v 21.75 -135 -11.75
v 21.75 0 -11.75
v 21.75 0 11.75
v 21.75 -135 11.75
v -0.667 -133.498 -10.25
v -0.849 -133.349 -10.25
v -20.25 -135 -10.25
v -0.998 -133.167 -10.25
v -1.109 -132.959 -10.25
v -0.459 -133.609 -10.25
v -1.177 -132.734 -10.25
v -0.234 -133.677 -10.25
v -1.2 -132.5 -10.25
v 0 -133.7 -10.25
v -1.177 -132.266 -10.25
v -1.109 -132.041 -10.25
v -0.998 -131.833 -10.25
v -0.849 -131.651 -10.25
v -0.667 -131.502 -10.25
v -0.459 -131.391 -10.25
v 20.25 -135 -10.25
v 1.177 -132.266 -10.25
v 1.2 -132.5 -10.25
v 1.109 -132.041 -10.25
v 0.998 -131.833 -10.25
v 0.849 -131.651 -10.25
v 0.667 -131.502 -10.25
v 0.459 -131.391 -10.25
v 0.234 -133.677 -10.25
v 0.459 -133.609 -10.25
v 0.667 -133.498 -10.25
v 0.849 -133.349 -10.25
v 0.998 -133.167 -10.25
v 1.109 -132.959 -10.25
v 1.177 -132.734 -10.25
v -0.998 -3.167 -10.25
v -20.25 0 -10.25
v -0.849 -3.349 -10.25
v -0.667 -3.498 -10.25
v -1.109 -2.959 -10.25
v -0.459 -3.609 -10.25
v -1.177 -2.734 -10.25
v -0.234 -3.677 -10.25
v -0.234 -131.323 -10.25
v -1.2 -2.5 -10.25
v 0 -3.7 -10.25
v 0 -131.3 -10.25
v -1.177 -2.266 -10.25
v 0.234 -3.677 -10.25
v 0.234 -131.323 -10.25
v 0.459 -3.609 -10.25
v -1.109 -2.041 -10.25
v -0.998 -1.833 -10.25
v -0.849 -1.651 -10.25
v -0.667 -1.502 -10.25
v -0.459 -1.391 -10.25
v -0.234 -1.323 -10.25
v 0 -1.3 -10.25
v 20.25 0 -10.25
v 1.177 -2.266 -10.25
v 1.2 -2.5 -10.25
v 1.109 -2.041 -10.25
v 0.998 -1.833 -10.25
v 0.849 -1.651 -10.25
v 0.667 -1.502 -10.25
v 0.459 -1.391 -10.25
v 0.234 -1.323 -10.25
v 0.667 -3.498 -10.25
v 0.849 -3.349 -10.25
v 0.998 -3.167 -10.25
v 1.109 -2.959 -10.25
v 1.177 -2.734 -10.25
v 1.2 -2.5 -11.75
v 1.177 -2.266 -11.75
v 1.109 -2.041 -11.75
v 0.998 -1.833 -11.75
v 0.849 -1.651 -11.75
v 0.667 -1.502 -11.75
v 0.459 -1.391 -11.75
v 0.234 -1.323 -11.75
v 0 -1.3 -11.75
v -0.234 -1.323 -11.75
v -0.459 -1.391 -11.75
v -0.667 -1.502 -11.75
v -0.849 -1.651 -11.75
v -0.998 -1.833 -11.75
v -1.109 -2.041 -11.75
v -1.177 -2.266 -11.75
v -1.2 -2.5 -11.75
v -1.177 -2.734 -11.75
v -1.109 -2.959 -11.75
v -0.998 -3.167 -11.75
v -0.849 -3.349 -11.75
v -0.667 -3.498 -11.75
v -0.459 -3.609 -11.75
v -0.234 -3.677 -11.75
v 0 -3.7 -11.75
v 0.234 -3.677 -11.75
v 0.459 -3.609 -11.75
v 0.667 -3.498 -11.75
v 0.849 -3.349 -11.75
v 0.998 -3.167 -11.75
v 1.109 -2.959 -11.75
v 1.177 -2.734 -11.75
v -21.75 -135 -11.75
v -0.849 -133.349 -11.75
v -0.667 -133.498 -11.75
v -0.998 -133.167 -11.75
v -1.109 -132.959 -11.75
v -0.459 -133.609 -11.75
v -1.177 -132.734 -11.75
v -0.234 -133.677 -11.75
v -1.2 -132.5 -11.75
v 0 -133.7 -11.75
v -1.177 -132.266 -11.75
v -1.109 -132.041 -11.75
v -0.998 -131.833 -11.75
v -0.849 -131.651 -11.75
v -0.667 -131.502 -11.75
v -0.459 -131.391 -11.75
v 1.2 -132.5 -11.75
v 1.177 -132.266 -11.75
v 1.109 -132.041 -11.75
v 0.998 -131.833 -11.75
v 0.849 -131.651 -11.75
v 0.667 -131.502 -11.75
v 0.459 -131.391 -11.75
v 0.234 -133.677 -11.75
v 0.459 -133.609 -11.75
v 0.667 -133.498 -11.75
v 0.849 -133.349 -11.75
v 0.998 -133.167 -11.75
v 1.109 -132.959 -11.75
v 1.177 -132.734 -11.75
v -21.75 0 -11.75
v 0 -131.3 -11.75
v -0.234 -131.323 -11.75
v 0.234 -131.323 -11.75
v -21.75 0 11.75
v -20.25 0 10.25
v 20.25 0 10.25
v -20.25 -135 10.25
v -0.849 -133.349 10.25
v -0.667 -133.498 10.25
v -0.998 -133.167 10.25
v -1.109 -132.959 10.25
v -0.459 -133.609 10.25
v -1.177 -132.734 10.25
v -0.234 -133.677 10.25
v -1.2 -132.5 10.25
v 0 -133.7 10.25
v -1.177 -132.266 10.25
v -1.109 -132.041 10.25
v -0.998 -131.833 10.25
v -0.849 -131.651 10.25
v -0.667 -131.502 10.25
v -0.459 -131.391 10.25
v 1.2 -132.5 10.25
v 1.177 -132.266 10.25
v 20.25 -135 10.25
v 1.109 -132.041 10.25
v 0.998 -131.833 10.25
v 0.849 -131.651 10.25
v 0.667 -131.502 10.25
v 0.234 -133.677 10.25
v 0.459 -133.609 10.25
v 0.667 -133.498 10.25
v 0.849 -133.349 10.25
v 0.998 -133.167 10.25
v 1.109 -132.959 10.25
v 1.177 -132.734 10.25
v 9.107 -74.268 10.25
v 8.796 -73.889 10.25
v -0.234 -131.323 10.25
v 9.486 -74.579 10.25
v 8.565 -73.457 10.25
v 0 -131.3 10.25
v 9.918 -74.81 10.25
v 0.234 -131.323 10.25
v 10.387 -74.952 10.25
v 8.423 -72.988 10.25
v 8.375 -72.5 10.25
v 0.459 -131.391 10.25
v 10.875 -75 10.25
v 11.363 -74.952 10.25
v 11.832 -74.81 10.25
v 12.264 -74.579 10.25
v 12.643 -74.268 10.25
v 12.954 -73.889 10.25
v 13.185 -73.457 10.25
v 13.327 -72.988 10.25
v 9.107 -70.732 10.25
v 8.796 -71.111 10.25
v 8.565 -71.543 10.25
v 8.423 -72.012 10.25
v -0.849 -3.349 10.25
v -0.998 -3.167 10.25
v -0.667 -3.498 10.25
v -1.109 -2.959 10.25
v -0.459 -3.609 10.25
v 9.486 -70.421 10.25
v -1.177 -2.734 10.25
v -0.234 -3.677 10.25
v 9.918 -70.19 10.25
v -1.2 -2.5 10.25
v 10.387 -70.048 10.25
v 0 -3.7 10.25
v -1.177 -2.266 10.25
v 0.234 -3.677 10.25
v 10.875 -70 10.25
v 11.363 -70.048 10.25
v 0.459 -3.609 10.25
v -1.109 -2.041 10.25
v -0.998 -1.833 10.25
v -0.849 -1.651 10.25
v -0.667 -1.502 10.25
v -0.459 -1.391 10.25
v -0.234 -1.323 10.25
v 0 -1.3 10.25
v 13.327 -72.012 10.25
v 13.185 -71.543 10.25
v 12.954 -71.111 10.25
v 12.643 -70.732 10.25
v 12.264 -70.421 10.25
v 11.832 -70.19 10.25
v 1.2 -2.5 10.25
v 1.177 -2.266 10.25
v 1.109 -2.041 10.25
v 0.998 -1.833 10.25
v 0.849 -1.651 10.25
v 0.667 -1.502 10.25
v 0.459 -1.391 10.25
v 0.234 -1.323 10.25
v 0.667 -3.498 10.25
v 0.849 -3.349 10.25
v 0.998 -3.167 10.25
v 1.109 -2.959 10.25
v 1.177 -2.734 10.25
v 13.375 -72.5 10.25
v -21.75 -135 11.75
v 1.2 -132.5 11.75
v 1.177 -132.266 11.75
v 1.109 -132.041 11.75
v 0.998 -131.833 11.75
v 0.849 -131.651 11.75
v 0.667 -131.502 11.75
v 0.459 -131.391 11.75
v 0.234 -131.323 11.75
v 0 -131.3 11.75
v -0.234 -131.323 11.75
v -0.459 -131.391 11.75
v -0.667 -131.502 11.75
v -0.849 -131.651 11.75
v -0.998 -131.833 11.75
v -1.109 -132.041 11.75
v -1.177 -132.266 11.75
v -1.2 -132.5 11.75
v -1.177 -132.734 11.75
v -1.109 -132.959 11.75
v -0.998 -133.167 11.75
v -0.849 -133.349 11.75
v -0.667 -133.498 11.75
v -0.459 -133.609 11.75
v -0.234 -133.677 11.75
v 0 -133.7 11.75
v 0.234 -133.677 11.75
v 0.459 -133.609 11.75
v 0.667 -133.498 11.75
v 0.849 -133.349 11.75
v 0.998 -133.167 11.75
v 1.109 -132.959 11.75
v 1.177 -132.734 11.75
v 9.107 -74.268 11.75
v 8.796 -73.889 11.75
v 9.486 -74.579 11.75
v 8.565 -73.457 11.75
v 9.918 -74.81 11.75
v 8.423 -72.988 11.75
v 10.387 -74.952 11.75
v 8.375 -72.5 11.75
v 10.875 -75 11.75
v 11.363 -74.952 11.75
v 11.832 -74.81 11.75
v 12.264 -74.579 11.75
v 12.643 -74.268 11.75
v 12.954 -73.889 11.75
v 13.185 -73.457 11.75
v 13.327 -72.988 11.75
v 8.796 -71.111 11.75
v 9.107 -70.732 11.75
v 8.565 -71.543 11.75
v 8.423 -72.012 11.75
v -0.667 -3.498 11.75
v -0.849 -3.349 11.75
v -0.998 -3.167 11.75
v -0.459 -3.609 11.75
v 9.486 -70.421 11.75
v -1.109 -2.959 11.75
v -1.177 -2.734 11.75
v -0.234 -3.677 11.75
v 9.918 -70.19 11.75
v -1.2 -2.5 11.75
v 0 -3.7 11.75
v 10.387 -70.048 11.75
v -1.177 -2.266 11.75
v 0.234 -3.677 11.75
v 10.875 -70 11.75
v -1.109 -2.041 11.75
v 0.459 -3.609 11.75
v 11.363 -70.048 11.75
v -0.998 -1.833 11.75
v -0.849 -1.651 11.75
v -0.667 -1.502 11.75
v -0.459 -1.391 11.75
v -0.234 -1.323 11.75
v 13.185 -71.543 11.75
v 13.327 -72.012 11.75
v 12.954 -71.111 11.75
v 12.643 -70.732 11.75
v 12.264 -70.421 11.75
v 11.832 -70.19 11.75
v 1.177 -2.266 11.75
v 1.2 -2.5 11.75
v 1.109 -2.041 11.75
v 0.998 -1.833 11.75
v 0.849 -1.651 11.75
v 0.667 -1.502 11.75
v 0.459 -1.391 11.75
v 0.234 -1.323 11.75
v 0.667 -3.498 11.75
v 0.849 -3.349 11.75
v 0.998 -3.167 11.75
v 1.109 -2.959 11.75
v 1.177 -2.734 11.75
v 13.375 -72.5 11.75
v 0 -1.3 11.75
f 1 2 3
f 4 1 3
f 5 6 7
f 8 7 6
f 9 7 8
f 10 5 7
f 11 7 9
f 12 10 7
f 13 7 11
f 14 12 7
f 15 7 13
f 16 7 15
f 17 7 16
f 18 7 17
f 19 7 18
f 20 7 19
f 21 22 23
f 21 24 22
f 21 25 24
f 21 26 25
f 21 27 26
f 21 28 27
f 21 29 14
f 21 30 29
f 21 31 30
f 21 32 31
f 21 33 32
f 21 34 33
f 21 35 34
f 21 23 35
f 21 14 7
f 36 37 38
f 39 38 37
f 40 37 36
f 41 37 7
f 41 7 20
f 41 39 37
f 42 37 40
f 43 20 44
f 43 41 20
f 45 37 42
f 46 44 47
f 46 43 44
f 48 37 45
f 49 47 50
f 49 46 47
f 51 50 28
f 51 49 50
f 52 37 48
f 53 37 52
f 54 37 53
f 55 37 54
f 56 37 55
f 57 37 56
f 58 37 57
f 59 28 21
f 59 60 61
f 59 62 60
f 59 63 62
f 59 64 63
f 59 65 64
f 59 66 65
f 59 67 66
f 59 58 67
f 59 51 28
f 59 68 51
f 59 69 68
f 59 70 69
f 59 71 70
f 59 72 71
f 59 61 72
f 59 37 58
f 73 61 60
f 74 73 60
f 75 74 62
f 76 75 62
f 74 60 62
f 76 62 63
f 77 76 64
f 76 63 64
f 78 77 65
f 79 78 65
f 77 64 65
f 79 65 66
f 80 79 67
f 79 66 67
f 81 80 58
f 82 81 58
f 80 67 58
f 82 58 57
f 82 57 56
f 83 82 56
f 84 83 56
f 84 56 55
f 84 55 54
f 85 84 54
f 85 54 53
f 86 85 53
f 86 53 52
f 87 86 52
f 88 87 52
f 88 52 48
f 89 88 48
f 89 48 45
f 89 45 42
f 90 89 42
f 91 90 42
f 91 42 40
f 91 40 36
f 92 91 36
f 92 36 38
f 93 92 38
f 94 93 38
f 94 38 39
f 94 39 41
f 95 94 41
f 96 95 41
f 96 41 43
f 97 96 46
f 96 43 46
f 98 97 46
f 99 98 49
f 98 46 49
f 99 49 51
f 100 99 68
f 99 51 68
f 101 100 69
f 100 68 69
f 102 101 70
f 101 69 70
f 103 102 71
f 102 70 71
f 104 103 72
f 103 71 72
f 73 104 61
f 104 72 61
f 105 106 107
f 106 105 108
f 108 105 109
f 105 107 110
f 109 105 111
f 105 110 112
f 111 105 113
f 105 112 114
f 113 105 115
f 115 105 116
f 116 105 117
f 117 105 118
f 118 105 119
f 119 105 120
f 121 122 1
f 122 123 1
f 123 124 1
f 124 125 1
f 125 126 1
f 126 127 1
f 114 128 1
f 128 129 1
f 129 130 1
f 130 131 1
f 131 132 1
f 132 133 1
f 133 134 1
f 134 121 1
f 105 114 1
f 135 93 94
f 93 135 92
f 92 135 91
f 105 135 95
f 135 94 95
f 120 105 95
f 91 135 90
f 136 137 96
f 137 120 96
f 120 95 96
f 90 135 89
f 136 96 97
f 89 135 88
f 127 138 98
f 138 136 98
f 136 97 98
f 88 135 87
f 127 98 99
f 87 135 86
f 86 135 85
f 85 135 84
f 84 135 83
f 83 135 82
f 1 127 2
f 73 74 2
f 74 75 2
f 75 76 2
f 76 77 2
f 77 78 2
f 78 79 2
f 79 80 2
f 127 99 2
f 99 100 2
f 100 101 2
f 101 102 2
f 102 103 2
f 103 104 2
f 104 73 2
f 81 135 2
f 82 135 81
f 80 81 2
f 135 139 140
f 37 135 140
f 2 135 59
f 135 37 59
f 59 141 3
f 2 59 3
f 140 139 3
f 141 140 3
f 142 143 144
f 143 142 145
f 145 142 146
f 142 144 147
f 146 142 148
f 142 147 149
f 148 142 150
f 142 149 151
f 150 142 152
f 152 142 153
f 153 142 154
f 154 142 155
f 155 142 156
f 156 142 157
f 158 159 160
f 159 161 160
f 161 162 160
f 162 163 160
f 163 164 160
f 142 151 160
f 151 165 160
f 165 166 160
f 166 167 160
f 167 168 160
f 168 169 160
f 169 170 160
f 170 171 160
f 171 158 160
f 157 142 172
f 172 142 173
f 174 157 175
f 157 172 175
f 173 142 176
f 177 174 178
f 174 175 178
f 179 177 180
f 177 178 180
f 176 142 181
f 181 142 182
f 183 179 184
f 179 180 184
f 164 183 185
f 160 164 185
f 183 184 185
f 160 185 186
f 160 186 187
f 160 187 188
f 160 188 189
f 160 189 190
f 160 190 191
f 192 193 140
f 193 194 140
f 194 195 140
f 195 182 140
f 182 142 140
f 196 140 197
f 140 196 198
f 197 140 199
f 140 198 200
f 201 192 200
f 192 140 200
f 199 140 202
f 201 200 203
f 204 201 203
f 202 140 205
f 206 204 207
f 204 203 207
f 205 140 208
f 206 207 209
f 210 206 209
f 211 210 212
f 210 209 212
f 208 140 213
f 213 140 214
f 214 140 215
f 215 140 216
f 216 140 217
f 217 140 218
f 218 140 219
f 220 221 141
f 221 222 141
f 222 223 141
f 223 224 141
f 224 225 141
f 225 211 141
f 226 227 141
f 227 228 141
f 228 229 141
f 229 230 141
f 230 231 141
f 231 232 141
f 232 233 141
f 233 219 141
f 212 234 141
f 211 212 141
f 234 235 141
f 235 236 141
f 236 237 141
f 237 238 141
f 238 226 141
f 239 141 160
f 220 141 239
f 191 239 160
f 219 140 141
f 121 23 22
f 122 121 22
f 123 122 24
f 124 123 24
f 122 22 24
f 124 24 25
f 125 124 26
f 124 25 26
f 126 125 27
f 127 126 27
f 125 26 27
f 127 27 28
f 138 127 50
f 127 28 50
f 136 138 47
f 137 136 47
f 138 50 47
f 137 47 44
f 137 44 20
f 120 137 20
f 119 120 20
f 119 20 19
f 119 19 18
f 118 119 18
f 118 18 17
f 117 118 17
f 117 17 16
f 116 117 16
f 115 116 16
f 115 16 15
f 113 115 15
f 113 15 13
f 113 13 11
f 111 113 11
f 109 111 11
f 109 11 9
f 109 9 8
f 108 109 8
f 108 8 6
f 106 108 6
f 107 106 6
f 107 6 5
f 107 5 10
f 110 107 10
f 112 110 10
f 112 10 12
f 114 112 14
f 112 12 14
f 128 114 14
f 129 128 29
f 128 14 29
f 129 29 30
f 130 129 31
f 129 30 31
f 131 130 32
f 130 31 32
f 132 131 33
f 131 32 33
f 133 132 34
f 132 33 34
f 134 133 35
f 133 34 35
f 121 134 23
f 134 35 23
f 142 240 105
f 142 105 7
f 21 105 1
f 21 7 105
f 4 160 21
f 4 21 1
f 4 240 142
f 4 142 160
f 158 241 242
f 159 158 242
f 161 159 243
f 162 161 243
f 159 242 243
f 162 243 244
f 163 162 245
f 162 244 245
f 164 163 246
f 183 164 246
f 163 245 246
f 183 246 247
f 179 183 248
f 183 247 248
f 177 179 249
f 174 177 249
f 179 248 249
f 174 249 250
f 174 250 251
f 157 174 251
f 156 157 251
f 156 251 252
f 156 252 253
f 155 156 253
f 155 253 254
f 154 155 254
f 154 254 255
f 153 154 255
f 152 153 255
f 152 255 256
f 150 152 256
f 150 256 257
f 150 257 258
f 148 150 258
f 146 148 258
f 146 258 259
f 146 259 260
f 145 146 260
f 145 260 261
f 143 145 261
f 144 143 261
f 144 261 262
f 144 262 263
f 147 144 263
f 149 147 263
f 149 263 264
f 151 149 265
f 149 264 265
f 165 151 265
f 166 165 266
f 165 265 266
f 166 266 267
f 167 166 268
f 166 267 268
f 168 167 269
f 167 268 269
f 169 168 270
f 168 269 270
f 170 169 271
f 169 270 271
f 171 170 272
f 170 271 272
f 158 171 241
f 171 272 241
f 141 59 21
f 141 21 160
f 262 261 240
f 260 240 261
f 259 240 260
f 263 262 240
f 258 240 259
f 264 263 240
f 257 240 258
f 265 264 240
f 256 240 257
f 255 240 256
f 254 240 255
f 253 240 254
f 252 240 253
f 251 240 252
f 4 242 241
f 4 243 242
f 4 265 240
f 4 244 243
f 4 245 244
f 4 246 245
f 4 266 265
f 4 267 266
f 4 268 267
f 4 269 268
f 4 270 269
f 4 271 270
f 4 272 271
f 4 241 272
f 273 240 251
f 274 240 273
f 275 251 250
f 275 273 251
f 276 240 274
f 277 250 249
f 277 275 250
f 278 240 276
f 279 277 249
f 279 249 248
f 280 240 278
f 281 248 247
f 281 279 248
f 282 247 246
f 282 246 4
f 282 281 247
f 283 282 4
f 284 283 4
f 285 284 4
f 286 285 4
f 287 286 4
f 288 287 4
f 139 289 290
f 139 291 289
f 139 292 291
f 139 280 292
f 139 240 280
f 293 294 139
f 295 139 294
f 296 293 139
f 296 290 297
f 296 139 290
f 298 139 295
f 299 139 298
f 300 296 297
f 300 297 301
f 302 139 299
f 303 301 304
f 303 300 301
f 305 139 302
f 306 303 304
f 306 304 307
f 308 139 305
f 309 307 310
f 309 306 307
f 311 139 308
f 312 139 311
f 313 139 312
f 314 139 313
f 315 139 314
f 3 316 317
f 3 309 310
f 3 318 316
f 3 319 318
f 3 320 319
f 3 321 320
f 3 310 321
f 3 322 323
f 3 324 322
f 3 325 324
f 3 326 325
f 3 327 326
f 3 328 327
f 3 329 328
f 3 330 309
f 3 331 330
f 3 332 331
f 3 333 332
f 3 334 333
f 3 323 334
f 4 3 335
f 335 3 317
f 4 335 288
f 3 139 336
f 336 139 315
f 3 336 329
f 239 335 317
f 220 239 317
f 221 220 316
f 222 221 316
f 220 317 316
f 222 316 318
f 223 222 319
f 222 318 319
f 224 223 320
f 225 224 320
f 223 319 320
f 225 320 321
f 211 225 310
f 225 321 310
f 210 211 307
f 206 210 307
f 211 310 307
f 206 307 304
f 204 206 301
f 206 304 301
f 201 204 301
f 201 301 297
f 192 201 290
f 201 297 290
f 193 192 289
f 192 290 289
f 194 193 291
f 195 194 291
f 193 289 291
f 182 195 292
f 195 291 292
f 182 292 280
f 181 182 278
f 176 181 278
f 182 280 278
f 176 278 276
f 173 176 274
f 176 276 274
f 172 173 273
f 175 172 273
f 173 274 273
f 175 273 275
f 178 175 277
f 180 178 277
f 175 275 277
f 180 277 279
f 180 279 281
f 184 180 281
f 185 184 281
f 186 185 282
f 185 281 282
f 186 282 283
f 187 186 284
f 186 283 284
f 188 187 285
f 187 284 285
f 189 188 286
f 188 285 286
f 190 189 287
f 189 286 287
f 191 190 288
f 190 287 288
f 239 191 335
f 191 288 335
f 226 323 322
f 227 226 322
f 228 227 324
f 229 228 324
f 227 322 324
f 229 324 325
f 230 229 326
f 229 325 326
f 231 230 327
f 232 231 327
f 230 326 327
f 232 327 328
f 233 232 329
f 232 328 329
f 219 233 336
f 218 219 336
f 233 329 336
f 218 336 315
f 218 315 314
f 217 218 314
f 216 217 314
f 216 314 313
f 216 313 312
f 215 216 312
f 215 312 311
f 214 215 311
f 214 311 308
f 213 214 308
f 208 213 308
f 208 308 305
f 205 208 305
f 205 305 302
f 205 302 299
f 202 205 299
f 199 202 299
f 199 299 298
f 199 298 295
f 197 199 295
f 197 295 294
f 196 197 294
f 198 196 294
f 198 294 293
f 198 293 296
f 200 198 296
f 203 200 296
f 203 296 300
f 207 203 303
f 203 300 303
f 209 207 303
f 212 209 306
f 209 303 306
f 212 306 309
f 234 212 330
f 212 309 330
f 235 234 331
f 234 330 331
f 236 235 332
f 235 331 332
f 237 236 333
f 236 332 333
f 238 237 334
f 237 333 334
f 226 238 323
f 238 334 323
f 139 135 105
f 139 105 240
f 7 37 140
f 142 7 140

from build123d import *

# Parameters (mm, degrees)
F0_W     = 43.5
F0_H     = 23.5
F0_W_2   = 40.5
F0_H_2   = 20.5
F1_DEPTH = 135
F2_R     = 2.5
F3_DEPTH = 1.5
F4_R     = 1.2
F5_DEPTH = 25


with BuildPart() as f1:
    # F0 (on Front) → F1 (new body)
    with BuildSketch(Plane.XZ):
        Rectangle(F0_W, F0_H)
        Rectangle(F0_W_2, F0_H_2, mode=Mode.SUBTRACT)
    extrude(amount=F1_DEPTH)

    # F2 (on face) → F3 (cut, through all)
    with BuildSketch(Plane.XY.offset(11.75)):
        with Locations((10.875, -72.5)):
            Circle(F2_R)
    extrude(amount=-F3_DEPTH, mode=Mode.SUBTRACT)

    # F4 (on face) → F5 (cut)
    with BuildSketch(Plane.XY.offset(11.75)):
        with Locations((0, -132.5)):
            Circle(F4_R)
        with Locations((0, -2.5)):
            Circle(F4_R)
    extrude(amount=-F5_DEPTH, mode=Mode.SUBTRACT)


solid = f1.part
